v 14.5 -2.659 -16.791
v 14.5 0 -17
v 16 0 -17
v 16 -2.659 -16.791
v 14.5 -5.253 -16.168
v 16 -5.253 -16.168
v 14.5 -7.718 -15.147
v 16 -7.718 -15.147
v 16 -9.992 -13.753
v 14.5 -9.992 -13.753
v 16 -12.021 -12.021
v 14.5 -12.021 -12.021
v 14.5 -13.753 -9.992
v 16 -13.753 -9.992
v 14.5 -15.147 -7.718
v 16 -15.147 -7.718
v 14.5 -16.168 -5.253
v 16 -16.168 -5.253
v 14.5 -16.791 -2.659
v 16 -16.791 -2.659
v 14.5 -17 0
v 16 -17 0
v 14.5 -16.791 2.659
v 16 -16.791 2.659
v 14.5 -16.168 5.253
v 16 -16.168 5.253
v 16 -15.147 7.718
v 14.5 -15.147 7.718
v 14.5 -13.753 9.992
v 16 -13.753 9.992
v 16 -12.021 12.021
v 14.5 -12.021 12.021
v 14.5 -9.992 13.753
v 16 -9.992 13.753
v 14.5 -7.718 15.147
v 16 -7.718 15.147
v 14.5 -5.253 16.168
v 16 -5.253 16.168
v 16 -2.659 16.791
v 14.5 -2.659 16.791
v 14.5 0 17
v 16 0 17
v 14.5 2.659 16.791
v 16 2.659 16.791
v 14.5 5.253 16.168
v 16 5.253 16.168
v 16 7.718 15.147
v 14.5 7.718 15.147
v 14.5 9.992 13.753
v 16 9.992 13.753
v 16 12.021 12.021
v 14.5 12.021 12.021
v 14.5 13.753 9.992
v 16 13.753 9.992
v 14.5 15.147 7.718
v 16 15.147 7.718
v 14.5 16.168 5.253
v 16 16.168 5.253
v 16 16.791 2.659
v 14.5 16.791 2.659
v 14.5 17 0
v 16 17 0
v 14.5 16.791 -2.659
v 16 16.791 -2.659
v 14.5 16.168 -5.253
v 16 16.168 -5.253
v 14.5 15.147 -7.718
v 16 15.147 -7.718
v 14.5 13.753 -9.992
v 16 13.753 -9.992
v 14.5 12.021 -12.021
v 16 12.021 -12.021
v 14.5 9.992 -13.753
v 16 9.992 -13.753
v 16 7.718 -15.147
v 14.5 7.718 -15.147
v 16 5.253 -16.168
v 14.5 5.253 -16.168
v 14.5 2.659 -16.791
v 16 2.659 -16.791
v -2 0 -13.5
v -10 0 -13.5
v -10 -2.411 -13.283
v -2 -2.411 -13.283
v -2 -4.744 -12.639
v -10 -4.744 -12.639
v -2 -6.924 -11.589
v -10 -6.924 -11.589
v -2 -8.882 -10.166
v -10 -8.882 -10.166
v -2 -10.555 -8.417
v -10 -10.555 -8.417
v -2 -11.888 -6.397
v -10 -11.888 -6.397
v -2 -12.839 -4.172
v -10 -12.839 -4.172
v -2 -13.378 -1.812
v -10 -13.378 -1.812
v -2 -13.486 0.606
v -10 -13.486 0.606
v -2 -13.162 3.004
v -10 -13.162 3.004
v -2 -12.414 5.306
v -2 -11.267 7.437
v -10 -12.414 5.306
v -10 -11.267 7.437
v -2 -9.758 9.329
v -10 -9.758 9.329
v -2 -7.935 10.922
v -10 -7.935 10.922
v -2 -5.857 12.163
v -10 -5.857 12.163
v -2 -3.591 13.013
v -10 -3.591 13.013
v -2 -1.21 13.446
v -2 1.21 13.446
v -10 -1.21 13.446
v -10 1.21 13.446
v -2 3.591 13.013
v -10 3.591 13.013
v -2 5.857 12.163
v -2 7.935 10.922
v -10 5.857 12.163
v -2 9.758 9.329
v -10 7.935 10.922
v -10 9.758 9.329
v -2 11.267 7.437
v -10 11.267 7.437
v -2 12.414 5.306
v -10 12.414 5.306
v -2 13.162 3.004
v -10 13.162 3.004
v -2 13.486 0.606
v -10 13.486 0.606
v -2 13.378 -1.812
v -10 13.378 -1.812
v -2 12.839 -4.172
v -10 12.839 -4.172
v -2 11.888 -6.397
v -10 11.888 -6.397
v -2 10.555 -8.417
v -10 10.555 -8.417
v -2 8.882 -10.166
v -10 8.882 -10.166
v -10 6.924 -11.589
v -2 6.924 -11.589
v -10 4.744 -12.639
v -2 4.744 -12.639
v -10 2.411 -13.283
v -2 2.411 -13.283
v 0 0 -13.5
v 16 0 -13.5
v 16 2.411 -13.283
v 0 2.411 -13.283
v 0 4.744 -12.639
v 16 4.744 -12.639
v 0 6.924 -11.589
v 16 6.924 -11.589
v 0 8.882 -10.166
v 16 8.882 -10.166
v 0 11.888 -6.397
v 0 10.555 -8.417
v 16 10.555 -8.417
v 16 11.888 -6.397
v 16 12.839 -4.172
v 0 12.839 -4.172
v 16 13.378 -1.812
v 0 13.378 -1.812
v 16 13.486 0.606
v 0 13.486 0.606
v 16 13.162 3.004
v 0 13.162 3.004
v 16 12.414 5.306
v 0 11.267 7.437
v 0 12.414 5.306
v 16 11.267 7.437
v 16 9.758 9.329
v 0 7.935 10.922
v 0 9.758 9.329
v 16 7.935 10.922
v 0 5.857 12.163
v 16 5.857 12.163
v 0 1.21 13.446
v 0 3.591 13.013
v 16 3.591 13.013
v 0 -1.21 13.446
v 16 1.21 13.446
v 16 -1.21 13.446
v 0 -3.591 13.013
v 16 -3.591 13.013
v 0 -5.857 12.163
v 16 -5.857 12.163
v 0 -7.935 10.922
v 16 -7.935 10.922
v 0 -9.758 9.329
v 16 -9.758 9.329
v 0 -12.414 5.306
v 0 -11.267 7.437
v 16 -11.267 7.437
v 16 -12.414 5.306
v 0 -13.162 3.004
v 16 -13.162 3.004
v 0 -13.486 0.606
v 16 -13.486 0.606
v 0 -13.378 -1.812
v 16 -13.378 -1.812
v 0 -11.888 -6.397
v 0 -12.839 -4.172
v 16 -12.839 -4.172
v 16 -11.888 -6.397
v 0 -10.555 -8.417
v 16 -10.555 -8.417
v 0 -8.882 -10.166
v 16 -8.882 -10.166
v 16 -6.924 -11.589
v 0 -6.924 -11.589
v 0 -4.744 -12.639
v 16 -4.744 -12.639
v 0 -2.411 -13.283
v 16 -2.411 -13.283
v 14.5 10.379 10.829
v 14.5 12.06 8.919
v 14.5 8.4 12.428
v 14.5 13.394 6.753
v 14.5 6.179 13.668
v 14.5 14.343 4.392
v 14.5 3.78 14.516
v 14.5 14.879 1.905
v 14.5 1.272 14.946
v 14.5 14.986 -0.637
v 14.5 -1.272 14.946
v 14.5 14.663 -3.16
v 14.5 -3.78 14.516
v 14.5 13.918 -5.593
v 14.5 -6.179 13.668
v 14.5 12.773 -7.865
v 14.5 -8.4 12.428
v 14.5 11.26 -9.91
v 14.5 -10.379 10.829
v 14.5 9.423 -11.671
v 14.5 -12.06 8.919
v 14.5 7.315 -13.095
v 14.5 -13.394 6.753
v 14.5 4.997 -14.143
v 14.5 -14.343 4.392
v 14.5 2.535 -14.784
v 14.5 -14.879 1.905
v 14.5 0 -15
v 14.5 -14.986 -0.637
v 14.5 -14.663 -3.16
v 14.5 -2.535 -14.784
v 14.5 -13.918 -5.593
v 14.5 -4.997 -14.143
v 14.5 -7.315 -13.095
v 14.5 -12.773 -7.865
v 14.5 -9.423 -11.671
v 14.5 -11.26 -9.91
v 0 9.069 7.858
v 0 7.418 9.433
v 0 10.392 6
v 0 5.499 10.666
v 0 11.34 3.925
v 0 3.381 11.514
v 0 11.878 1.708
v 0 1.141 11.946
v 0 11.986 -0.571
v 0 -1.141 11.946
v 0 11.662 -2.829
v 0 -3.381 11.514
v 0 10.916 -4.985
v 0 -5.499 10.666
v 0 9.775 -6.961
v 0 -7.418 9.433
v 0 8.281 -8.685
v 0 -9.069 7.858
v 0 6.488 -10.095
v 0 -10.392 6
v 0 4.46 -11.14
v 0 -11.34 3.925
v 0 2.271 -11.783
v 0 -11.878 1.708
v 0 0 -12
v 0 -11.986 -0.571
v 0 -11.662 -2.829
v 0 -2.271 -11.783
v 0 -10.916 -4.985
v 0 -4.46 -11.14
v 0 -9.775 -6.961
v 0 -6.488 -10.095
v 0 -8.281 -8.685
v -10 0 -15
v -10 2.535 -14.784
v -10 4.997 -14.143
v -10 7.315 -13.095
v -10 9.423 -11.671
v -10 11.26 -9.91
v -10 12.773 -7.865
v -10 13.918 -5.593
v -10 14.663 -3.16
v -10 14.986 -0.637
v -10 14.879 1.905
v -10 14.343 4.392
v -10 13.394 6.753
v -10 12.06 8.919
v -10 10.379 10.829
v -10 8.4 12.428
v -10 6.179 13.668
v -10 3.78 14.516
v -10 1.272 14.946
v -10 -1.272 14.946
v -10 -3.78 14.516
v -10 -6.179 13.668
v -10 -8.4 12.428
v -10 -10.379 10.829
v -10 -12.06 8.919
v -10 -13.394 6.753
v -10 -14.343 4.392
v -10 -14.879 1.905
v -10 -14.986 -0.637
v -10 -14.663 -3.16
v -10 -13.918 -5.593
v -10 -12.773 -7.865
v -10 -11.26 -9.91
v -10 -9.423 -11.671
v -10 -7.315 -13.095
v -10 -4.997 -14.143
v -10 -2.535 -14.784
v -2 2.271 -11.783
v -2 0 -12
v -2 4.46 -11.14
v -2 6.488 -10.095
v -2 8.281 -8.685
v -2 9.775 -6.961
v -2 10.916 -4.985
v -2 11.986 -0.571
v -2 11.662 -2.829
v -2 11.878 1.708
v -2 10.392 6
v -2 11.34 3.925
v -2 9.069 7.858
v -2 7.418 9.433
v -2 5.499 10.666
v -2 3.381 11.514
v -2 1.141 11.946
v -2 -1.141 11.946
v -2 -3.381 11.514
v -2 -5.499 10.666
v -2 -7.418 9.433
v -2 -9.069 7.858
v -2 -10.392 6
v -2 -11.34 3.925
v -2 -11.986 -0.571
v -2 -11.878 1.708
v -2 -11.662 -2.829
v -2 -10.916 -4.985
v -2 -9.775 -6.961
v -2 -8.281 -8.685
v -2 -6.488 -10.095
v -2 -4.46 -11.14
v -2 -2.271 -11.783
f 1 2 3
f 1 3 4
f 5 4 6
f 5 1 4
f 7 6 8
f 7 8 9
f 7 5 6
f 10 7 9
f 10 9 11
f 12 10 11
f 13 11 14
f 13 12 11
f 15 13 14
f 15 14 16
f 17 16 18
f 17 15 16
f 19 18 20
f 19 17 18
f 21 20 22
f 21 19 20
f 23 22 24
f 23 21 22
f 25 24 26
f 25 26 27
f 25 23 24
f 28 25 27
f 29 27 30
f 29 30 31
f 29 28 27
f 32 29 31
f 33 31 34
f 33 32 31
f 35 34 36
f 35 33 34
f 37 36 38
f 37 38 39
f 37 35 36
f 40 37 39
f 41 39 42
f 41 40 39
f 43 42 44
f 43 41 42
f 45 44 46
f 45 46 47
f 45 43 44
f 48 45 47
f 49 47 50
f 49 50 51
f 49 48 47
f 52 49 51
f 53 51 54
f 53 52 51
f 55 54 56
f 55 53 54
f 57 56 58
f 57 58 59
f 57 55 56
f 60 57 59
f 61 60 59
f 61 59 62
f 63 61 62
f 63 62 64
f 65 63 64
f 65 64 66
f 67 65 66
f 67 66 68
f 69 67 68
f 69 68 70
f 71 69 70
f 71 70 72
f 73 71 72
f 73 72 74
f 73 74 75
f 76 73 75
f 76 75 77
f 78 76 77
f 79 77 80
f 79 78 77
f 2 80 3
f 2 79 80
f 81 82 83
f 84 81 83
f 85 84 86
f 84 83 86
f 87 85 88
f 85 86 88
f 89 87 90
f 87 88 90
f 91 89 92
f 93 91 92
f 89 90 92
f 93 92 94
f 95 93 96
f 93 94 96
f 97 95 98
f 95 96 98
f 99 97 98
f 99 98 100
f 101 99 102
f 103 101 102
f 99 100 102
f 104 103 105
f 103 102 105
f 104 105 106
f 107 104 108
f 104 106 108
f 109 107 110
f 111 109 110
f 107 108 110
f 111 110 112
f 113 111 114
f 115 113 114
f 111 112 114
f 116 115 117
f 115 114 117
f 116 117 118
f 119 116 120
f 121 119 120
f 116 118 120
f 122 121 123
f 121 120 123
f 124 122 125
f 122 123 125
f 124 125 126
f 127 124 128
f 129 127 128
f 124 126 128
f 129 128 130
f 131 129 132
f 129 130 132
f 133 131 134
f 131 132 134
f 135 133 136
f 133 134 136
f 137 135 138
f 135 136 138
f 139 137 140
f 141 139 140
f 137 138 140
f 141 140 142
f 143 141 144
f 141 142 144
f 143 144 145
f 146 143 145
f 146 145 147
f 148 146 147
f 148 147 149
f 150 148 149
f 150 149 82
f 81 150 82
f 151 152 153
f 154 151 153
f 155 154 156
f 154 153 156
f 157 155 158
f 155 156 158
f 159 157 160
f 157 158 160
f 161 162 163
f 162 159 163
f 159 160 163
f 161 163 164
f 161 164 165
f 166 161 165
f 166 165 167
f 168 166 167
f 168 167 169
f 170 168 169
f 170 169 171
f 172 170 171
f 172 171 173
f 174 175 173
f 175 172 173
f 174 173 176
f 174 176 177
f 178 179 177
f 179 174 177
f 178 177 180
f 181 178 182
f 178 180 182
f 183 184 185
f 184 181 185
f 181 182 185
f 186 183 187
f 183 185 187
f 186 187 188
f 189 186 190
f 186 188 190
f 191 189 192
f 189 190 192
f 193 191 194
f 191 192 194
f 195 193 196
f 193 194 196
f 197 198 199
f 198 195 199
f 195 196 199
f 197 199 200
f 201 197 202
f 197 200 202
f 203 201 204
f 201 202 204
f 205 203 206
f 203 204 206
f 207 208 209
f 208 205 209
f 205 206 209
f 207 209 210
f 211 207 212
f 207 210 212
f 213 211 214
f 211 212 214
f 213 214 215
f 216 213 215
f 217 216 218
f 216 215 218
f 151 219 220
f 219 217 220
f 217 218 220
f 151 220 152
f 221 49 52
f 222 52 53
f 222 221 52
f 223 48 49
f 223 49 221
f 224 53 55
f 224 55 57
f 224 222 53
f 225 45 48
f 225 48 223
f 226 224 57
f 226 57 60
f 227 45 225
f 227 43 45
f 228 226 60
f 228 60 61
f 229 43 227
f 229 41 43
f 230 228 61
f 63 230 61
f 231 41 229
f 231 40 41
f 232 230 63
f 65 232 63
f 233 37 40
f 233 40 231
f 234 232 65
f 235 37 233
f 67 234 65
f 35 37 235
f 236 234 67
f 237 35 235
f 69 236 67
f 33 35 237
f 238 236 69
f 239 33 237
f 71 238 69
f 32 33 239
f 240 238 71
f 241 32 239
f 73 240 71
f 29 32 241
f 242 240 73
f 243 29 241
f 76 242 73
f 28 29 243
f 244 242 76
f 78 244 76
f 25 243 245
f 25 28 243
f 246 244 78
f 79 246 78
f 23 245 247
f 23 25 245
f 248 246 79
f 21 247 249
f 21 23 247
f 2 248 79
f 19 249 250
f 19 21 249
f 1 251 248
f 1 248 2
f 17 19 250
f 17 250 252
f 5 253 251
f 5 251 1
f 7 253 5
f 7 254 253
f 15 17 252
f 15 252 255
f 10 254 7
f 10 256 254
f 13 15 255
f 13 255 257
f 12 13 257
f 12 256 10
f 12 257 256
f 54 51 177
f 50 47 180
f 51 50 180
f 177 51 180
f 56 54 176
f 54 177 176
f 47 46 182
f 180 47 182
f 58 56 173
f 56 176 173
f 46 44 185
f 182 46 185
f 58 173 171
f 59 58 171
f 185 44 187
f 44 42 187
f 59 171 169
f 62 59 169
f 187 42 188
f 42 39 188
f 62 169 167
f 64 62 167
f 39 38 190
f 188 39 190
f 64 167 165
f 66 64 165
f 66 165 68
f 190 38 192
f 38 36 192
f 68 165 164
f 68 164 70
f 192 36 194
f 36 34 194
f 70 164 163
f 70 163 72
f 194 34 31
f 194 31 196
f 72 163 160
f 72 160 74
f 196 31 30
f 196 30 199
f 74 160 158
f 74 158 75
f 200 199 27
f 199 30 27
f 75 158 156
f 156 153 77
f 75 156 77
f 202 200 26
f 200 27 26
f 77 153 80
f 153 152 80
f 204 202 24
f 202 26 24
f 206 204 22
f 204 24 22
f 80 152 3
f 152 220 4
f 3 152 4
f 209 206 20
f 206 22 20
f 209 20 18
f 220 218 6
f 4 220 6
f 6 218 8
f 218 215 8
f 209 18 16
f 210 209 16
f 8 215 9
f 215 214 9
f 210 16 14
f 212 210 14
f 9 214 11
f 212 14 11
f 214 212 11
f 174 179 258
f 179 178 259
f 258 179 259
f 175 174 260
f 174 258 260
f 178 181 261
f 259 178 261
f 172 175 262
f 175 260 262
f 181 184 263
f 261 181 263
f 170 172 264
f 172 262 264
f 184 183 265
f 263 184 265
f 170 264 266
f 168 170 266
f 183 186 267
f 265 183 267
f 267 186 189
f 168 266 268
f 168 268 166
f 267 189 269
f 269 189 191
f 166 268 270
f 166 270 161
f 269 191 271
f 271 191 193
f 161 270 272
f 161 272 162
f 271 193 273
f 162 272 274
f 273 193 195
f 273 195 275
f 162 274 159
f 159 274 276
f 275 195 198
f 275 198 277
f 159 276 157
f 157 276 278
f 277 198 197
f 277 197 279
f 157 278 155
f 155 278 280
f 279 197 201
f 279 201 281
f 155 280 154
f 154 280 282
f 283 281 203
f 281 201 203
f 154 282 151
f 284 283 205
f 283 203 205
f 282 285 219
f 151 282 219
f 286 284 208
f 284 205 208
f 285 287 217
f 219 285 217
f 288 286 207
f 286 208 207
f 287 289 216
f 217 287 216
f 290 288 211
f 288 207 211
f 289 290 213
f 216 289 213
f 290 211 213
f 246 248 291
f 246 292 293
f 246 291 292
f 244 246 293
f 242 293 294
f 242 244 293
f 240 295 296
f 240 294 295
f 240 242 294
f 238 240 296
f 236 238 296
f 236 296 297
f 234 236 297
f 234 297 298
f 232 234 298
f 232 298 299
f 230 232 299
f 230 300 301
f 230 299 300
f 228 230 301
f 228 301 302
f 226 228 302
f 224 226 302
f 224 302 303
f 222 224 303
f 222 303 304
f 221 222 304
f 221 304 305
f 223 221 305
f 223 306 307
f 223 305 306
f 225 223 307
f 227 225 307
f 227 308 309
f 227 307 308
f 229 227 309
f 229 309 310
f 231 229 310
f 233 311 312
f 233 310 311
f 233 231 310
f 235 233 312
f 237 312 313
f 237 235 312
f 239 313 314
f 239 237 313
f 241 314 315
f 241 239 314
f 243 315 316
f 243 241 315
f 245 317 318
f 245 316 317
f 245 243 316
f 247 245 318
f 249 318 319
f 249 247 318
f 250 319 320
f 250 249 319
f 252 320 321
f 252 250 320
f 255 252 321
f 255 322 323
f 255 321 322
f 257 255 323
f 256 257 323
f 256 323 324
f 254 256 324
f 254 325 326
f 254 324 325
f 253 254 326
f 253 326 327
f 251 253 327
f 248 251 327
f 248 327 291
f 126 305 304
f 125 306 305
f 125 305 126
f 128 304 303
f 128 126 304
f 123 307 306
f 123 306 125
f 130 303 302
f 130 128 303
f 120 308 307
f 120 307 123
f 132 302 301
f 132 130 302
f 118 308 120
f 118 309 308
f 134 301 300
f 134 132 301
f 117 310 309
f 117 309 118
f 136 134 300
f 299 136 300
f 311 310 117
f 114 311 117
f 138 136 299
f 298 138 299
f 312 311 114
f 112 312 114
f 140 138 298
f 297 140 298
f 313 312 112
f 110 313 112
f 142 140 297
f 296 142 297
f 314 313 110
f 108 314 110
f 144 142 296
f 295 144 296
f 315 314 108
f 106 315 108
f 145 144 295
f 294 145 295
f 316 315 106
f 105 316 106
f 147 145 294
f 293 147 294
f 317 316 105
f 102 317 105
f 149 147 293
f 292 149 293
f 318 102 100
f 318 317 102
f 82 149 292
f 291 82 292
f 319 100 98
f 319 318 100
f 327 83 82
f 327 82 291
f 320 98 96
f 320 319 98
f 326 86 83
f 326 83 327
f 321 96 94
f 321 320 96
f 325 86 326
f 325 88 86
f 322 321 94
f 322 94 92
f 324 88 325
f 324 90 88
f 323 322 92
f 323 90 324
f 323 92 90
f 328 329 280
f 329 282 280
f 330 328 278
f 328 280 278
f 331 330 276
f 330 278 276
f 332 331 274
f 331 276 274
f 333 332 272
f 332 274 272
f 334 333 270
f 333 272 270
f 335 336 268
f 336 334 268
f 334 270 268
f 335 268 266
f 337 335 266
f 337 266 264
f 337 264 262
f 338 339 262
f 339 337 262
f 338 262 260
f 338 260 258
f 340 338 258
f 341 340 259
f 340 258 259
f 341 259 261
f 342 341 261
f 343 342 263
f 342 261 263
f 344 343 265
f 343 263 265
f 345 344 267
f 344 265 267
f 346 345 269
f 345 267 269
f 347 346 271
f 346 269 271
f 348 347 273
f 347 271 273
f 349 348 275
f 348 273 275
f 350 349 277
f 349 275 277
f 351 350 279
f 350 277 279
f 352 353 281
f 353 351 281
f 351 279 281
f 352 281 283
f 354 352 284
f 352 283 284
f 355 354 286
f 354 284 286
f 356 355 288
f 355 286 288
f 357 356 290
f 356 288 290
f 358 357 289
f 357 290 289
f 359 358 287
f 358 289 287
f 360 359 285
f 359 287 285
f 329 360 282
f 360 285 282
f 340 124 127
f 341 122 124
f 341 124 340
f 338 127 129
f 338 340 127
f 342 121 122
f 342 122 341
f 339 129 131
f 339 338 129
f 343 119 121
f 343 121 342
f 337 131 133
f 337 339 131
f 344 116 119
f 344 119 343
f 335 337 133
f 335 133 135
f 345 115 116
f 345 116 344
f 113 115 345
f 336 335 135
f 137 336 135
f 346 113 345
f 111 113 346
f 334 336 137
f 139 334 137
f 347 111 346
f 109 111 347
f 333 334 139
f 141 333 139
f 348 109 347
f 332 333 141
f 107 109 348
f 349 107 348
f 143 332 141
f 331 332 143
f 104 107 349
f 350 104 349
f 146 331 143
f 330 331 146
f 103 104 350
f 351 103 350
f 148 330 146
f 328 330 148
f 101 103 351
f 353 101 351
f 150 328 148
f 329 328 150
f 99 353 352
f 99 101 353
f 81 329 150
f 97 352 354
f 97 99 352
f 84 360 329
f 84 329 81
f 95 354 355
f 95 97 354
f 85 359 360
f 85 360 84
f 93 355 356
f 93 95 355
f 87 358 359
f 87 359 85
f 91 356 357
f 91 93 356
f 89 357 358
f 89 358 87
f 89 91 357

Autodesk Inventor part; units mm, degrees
ref_plane "YZ Plane" through (0, 0, 0) normal (1, 0, 0) x (0, 1, 0)
ref_plane "XZ Plane" through (0, 0, 0) normal (0, 1, 0) x (-1, 0, 0)
ref_plane "XY Plane" through (0, 0, 0) normal (0, 0, 1) x (1, 0, 0)
sketch "Sketch1" plane through (0, 0, 0) normal (0, 1, 0) x (-1, 0, 0)
  line L0 (0, 0) -> (10, 0)
  line L1 (2, -13.5) -> (10, -13.5)
  line L2 (2, -13.5) -> (2, -12)
  line L3 (2, -12) -> (0, -12)
  line L4 (10, -15) -> (10, -13.5)
  line L5 (0, -13.5) -> (-16, -13.5)
  line L6 (0, -13.5) -> (0, -12)
  line L7 (-16, -13.5) -> (-16, -17)
  line L8 (-16, -17) -> (-14.5, -17)
  line L9 (-14.5, -17) -> (-14.5, -15)
  line L10 (10, -15) -> (-14.5, -15)
  dimension "d0" = 1.5
  dimension "d4" = 1.5
  dimension "d5" = 10
  dimension "d7" = 24
  dimension "d8" = 27
  dimension "d11" = 16
  dimension "d12" = 27
  dimension "d13" = 1.5
  dimension "d14" = 34
  dimension "d16" = 2
revolve "Revolution1" add sketch "Sketch1" angle 360 about axis through (0, 0, 0) along (-1, 0, 0)
thread "Thread1" size "M30x1" class "6g" standard "ANSI Metric M Profile" length 5
properties part number "030" material "Aluminum 6061"
